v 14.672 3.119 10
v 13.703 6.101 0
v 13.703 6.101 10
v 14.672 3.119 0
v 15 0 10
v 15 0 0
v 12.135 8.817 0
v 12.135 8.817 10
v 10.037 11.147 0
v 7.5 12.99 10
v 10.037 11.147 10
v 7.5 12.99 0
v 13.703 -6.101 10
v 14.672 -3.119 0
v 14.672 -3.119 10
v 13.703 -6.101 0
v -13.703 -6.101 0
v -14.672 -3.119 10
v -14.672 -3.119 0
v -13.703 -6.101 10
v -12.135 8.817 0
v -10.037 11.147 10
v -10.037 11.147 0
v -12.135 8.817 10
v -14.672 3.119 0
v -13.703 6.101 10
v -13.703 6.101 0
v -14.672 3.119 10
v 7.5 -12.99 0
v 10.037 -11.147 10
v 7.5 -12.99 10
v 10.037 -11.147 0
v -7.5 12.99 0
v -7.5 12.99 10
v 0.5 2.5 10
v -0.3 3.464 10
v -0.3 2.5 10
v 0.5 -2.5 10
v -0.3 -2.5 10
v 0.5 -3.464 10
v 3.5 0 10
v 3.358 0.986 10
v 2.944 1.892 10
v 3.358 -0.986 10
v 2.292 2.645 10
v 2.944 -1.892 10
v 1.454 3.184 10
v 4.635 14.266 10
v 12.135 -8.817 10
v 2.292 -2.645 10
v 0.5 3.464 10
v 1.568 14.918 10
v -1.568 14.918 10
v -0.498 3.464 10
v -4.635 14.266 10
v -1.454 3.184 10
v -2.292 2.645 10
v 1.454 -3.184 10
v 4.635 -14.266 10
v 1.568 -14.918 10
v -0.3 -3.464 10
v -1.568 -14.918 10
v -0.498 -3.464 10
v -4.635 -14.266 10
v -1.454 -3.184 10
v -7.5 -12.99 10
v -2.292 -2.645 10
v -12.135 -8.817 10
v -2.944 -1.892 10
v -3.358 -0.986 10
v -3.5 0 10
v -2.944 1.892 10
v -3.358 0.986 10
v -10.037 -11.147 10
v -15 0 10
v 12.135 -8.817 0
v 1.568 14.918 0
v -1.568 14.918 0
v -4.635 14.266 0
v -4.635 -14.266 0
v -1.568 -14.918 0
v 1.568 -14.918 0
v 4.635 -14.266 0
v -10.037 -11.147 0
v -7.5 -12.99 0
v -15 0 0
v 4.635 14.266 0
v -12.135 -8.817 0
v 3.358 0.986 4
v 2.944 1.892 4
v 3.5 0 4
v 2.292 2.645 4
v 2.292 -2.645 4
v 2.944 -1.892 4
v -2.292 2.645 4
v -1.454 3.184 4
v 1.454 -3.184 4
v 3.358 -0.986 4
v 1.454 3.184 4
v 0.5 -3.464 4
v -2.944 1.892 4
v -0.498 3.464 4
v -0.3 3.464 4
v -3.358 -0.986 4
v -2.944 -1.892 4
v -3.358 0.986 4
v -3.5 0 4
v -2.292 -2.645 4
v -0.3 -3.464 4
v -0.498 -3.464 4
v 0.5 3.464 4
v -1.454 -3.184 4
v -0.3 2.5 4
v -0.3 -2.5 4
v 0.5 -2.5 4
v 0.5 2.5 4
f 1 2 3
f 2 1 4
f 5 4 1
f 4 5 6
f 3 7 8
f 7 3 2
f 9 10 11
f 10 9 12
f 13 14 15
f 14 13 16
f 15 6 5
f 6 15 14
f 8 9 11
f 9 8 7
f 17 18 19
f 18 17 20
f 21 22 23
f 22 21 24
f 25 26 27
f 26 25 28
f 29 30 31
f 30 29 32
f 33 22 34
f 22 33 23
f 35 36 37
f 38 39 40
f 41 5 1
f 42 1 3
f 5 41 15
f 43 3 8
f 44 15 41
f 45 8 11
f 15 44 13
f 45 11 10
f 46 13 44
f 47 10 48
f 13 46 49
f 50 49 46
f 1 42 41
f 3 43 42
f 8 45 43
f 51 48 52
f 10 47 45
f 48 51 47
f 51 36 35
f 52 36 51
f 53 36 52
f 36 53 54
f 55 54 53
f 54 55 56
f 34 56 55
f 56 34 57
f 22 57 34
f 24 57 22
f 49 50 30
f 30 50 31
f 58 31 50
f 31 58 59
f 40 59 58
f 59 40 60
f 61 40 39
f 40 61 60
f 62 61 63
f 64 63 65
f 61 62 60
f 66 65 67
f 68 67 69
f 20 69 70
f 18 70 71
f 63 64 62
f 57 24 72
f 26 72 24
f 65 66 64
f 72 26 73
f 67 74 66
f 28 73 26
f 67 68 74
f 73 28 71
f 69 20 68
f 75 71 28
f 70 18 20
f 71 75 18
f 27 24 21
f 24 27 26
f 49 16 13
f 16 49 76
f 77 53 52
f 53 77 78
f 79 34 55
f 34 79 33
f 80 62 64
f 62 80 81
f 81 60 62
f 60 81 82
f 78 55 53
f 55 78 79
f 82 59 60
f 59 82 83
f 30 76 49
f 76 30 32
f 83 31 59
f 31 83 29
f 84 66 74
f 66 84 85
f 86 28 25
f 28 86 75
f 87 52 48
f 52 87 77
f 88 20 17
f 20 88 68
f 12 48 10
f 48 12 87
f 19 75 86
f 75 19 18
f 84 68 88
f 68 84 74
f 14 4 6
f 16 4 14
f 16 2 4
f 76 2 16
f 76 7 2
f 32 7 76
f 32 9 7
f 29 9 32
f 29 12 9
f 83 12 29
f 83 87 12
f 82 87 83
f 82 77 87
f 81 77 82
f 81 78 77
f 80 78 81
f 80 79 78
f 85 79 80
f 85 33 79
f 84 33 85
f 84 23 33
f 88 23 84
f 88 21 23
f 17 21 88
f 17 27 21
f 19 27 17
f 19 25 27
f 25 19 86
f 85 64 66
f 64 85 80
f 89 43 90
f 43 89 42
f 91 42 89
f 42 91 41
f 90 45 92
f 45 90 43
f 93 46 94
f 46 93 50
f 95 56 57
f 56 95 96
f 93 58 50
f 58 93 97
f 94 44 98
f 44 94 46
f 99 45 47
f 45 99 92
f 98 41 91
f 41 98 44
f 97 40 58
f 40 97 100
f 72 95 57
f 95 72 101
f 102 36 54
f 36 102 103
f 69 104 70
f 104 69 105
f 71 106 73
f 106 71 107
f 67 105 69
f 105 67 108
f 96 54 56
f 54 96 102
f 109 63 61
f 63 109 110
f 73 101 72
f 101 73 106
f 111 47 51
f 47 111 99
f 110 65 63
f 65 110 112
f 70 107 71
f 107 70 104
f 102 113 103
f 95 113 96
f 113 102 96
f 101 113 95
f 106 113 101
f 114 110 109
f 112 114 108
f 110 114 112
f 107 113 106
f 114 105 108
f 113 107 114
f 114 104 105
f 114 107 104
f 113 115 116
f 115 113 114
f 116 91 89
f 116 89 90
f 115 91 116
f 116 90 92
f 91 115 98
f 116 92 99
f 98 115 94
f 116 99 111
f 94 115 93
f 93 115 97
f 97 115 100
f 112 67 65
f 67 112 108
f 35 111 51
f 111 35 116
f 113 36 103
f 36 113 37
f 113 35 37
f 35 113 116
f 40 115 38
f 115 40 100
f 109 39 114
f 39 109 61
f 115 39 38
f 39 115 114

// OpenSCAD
module menuKnobManipulator()
{
  difference()
  {
    // part's body
    cylinder(r=30/2, h=10, $fs=1);
    // hole for encoder's sticking-out part ;)
    translate([0,0,10-6])
      cylinder(r=(6+1)/2, h=6, $fs=1);
  }
  // driver part 1
  translate([-(1-0.4)/2, -1/2+3, 10-6])
    cube([1-0.2, 1, 6]);
  // driver part 2
  translate([-(1-0.4)/2, -1/2-3, 10-6])
    cube([1-0.2, 1, 6]);
}

menuKnobManipulator();
